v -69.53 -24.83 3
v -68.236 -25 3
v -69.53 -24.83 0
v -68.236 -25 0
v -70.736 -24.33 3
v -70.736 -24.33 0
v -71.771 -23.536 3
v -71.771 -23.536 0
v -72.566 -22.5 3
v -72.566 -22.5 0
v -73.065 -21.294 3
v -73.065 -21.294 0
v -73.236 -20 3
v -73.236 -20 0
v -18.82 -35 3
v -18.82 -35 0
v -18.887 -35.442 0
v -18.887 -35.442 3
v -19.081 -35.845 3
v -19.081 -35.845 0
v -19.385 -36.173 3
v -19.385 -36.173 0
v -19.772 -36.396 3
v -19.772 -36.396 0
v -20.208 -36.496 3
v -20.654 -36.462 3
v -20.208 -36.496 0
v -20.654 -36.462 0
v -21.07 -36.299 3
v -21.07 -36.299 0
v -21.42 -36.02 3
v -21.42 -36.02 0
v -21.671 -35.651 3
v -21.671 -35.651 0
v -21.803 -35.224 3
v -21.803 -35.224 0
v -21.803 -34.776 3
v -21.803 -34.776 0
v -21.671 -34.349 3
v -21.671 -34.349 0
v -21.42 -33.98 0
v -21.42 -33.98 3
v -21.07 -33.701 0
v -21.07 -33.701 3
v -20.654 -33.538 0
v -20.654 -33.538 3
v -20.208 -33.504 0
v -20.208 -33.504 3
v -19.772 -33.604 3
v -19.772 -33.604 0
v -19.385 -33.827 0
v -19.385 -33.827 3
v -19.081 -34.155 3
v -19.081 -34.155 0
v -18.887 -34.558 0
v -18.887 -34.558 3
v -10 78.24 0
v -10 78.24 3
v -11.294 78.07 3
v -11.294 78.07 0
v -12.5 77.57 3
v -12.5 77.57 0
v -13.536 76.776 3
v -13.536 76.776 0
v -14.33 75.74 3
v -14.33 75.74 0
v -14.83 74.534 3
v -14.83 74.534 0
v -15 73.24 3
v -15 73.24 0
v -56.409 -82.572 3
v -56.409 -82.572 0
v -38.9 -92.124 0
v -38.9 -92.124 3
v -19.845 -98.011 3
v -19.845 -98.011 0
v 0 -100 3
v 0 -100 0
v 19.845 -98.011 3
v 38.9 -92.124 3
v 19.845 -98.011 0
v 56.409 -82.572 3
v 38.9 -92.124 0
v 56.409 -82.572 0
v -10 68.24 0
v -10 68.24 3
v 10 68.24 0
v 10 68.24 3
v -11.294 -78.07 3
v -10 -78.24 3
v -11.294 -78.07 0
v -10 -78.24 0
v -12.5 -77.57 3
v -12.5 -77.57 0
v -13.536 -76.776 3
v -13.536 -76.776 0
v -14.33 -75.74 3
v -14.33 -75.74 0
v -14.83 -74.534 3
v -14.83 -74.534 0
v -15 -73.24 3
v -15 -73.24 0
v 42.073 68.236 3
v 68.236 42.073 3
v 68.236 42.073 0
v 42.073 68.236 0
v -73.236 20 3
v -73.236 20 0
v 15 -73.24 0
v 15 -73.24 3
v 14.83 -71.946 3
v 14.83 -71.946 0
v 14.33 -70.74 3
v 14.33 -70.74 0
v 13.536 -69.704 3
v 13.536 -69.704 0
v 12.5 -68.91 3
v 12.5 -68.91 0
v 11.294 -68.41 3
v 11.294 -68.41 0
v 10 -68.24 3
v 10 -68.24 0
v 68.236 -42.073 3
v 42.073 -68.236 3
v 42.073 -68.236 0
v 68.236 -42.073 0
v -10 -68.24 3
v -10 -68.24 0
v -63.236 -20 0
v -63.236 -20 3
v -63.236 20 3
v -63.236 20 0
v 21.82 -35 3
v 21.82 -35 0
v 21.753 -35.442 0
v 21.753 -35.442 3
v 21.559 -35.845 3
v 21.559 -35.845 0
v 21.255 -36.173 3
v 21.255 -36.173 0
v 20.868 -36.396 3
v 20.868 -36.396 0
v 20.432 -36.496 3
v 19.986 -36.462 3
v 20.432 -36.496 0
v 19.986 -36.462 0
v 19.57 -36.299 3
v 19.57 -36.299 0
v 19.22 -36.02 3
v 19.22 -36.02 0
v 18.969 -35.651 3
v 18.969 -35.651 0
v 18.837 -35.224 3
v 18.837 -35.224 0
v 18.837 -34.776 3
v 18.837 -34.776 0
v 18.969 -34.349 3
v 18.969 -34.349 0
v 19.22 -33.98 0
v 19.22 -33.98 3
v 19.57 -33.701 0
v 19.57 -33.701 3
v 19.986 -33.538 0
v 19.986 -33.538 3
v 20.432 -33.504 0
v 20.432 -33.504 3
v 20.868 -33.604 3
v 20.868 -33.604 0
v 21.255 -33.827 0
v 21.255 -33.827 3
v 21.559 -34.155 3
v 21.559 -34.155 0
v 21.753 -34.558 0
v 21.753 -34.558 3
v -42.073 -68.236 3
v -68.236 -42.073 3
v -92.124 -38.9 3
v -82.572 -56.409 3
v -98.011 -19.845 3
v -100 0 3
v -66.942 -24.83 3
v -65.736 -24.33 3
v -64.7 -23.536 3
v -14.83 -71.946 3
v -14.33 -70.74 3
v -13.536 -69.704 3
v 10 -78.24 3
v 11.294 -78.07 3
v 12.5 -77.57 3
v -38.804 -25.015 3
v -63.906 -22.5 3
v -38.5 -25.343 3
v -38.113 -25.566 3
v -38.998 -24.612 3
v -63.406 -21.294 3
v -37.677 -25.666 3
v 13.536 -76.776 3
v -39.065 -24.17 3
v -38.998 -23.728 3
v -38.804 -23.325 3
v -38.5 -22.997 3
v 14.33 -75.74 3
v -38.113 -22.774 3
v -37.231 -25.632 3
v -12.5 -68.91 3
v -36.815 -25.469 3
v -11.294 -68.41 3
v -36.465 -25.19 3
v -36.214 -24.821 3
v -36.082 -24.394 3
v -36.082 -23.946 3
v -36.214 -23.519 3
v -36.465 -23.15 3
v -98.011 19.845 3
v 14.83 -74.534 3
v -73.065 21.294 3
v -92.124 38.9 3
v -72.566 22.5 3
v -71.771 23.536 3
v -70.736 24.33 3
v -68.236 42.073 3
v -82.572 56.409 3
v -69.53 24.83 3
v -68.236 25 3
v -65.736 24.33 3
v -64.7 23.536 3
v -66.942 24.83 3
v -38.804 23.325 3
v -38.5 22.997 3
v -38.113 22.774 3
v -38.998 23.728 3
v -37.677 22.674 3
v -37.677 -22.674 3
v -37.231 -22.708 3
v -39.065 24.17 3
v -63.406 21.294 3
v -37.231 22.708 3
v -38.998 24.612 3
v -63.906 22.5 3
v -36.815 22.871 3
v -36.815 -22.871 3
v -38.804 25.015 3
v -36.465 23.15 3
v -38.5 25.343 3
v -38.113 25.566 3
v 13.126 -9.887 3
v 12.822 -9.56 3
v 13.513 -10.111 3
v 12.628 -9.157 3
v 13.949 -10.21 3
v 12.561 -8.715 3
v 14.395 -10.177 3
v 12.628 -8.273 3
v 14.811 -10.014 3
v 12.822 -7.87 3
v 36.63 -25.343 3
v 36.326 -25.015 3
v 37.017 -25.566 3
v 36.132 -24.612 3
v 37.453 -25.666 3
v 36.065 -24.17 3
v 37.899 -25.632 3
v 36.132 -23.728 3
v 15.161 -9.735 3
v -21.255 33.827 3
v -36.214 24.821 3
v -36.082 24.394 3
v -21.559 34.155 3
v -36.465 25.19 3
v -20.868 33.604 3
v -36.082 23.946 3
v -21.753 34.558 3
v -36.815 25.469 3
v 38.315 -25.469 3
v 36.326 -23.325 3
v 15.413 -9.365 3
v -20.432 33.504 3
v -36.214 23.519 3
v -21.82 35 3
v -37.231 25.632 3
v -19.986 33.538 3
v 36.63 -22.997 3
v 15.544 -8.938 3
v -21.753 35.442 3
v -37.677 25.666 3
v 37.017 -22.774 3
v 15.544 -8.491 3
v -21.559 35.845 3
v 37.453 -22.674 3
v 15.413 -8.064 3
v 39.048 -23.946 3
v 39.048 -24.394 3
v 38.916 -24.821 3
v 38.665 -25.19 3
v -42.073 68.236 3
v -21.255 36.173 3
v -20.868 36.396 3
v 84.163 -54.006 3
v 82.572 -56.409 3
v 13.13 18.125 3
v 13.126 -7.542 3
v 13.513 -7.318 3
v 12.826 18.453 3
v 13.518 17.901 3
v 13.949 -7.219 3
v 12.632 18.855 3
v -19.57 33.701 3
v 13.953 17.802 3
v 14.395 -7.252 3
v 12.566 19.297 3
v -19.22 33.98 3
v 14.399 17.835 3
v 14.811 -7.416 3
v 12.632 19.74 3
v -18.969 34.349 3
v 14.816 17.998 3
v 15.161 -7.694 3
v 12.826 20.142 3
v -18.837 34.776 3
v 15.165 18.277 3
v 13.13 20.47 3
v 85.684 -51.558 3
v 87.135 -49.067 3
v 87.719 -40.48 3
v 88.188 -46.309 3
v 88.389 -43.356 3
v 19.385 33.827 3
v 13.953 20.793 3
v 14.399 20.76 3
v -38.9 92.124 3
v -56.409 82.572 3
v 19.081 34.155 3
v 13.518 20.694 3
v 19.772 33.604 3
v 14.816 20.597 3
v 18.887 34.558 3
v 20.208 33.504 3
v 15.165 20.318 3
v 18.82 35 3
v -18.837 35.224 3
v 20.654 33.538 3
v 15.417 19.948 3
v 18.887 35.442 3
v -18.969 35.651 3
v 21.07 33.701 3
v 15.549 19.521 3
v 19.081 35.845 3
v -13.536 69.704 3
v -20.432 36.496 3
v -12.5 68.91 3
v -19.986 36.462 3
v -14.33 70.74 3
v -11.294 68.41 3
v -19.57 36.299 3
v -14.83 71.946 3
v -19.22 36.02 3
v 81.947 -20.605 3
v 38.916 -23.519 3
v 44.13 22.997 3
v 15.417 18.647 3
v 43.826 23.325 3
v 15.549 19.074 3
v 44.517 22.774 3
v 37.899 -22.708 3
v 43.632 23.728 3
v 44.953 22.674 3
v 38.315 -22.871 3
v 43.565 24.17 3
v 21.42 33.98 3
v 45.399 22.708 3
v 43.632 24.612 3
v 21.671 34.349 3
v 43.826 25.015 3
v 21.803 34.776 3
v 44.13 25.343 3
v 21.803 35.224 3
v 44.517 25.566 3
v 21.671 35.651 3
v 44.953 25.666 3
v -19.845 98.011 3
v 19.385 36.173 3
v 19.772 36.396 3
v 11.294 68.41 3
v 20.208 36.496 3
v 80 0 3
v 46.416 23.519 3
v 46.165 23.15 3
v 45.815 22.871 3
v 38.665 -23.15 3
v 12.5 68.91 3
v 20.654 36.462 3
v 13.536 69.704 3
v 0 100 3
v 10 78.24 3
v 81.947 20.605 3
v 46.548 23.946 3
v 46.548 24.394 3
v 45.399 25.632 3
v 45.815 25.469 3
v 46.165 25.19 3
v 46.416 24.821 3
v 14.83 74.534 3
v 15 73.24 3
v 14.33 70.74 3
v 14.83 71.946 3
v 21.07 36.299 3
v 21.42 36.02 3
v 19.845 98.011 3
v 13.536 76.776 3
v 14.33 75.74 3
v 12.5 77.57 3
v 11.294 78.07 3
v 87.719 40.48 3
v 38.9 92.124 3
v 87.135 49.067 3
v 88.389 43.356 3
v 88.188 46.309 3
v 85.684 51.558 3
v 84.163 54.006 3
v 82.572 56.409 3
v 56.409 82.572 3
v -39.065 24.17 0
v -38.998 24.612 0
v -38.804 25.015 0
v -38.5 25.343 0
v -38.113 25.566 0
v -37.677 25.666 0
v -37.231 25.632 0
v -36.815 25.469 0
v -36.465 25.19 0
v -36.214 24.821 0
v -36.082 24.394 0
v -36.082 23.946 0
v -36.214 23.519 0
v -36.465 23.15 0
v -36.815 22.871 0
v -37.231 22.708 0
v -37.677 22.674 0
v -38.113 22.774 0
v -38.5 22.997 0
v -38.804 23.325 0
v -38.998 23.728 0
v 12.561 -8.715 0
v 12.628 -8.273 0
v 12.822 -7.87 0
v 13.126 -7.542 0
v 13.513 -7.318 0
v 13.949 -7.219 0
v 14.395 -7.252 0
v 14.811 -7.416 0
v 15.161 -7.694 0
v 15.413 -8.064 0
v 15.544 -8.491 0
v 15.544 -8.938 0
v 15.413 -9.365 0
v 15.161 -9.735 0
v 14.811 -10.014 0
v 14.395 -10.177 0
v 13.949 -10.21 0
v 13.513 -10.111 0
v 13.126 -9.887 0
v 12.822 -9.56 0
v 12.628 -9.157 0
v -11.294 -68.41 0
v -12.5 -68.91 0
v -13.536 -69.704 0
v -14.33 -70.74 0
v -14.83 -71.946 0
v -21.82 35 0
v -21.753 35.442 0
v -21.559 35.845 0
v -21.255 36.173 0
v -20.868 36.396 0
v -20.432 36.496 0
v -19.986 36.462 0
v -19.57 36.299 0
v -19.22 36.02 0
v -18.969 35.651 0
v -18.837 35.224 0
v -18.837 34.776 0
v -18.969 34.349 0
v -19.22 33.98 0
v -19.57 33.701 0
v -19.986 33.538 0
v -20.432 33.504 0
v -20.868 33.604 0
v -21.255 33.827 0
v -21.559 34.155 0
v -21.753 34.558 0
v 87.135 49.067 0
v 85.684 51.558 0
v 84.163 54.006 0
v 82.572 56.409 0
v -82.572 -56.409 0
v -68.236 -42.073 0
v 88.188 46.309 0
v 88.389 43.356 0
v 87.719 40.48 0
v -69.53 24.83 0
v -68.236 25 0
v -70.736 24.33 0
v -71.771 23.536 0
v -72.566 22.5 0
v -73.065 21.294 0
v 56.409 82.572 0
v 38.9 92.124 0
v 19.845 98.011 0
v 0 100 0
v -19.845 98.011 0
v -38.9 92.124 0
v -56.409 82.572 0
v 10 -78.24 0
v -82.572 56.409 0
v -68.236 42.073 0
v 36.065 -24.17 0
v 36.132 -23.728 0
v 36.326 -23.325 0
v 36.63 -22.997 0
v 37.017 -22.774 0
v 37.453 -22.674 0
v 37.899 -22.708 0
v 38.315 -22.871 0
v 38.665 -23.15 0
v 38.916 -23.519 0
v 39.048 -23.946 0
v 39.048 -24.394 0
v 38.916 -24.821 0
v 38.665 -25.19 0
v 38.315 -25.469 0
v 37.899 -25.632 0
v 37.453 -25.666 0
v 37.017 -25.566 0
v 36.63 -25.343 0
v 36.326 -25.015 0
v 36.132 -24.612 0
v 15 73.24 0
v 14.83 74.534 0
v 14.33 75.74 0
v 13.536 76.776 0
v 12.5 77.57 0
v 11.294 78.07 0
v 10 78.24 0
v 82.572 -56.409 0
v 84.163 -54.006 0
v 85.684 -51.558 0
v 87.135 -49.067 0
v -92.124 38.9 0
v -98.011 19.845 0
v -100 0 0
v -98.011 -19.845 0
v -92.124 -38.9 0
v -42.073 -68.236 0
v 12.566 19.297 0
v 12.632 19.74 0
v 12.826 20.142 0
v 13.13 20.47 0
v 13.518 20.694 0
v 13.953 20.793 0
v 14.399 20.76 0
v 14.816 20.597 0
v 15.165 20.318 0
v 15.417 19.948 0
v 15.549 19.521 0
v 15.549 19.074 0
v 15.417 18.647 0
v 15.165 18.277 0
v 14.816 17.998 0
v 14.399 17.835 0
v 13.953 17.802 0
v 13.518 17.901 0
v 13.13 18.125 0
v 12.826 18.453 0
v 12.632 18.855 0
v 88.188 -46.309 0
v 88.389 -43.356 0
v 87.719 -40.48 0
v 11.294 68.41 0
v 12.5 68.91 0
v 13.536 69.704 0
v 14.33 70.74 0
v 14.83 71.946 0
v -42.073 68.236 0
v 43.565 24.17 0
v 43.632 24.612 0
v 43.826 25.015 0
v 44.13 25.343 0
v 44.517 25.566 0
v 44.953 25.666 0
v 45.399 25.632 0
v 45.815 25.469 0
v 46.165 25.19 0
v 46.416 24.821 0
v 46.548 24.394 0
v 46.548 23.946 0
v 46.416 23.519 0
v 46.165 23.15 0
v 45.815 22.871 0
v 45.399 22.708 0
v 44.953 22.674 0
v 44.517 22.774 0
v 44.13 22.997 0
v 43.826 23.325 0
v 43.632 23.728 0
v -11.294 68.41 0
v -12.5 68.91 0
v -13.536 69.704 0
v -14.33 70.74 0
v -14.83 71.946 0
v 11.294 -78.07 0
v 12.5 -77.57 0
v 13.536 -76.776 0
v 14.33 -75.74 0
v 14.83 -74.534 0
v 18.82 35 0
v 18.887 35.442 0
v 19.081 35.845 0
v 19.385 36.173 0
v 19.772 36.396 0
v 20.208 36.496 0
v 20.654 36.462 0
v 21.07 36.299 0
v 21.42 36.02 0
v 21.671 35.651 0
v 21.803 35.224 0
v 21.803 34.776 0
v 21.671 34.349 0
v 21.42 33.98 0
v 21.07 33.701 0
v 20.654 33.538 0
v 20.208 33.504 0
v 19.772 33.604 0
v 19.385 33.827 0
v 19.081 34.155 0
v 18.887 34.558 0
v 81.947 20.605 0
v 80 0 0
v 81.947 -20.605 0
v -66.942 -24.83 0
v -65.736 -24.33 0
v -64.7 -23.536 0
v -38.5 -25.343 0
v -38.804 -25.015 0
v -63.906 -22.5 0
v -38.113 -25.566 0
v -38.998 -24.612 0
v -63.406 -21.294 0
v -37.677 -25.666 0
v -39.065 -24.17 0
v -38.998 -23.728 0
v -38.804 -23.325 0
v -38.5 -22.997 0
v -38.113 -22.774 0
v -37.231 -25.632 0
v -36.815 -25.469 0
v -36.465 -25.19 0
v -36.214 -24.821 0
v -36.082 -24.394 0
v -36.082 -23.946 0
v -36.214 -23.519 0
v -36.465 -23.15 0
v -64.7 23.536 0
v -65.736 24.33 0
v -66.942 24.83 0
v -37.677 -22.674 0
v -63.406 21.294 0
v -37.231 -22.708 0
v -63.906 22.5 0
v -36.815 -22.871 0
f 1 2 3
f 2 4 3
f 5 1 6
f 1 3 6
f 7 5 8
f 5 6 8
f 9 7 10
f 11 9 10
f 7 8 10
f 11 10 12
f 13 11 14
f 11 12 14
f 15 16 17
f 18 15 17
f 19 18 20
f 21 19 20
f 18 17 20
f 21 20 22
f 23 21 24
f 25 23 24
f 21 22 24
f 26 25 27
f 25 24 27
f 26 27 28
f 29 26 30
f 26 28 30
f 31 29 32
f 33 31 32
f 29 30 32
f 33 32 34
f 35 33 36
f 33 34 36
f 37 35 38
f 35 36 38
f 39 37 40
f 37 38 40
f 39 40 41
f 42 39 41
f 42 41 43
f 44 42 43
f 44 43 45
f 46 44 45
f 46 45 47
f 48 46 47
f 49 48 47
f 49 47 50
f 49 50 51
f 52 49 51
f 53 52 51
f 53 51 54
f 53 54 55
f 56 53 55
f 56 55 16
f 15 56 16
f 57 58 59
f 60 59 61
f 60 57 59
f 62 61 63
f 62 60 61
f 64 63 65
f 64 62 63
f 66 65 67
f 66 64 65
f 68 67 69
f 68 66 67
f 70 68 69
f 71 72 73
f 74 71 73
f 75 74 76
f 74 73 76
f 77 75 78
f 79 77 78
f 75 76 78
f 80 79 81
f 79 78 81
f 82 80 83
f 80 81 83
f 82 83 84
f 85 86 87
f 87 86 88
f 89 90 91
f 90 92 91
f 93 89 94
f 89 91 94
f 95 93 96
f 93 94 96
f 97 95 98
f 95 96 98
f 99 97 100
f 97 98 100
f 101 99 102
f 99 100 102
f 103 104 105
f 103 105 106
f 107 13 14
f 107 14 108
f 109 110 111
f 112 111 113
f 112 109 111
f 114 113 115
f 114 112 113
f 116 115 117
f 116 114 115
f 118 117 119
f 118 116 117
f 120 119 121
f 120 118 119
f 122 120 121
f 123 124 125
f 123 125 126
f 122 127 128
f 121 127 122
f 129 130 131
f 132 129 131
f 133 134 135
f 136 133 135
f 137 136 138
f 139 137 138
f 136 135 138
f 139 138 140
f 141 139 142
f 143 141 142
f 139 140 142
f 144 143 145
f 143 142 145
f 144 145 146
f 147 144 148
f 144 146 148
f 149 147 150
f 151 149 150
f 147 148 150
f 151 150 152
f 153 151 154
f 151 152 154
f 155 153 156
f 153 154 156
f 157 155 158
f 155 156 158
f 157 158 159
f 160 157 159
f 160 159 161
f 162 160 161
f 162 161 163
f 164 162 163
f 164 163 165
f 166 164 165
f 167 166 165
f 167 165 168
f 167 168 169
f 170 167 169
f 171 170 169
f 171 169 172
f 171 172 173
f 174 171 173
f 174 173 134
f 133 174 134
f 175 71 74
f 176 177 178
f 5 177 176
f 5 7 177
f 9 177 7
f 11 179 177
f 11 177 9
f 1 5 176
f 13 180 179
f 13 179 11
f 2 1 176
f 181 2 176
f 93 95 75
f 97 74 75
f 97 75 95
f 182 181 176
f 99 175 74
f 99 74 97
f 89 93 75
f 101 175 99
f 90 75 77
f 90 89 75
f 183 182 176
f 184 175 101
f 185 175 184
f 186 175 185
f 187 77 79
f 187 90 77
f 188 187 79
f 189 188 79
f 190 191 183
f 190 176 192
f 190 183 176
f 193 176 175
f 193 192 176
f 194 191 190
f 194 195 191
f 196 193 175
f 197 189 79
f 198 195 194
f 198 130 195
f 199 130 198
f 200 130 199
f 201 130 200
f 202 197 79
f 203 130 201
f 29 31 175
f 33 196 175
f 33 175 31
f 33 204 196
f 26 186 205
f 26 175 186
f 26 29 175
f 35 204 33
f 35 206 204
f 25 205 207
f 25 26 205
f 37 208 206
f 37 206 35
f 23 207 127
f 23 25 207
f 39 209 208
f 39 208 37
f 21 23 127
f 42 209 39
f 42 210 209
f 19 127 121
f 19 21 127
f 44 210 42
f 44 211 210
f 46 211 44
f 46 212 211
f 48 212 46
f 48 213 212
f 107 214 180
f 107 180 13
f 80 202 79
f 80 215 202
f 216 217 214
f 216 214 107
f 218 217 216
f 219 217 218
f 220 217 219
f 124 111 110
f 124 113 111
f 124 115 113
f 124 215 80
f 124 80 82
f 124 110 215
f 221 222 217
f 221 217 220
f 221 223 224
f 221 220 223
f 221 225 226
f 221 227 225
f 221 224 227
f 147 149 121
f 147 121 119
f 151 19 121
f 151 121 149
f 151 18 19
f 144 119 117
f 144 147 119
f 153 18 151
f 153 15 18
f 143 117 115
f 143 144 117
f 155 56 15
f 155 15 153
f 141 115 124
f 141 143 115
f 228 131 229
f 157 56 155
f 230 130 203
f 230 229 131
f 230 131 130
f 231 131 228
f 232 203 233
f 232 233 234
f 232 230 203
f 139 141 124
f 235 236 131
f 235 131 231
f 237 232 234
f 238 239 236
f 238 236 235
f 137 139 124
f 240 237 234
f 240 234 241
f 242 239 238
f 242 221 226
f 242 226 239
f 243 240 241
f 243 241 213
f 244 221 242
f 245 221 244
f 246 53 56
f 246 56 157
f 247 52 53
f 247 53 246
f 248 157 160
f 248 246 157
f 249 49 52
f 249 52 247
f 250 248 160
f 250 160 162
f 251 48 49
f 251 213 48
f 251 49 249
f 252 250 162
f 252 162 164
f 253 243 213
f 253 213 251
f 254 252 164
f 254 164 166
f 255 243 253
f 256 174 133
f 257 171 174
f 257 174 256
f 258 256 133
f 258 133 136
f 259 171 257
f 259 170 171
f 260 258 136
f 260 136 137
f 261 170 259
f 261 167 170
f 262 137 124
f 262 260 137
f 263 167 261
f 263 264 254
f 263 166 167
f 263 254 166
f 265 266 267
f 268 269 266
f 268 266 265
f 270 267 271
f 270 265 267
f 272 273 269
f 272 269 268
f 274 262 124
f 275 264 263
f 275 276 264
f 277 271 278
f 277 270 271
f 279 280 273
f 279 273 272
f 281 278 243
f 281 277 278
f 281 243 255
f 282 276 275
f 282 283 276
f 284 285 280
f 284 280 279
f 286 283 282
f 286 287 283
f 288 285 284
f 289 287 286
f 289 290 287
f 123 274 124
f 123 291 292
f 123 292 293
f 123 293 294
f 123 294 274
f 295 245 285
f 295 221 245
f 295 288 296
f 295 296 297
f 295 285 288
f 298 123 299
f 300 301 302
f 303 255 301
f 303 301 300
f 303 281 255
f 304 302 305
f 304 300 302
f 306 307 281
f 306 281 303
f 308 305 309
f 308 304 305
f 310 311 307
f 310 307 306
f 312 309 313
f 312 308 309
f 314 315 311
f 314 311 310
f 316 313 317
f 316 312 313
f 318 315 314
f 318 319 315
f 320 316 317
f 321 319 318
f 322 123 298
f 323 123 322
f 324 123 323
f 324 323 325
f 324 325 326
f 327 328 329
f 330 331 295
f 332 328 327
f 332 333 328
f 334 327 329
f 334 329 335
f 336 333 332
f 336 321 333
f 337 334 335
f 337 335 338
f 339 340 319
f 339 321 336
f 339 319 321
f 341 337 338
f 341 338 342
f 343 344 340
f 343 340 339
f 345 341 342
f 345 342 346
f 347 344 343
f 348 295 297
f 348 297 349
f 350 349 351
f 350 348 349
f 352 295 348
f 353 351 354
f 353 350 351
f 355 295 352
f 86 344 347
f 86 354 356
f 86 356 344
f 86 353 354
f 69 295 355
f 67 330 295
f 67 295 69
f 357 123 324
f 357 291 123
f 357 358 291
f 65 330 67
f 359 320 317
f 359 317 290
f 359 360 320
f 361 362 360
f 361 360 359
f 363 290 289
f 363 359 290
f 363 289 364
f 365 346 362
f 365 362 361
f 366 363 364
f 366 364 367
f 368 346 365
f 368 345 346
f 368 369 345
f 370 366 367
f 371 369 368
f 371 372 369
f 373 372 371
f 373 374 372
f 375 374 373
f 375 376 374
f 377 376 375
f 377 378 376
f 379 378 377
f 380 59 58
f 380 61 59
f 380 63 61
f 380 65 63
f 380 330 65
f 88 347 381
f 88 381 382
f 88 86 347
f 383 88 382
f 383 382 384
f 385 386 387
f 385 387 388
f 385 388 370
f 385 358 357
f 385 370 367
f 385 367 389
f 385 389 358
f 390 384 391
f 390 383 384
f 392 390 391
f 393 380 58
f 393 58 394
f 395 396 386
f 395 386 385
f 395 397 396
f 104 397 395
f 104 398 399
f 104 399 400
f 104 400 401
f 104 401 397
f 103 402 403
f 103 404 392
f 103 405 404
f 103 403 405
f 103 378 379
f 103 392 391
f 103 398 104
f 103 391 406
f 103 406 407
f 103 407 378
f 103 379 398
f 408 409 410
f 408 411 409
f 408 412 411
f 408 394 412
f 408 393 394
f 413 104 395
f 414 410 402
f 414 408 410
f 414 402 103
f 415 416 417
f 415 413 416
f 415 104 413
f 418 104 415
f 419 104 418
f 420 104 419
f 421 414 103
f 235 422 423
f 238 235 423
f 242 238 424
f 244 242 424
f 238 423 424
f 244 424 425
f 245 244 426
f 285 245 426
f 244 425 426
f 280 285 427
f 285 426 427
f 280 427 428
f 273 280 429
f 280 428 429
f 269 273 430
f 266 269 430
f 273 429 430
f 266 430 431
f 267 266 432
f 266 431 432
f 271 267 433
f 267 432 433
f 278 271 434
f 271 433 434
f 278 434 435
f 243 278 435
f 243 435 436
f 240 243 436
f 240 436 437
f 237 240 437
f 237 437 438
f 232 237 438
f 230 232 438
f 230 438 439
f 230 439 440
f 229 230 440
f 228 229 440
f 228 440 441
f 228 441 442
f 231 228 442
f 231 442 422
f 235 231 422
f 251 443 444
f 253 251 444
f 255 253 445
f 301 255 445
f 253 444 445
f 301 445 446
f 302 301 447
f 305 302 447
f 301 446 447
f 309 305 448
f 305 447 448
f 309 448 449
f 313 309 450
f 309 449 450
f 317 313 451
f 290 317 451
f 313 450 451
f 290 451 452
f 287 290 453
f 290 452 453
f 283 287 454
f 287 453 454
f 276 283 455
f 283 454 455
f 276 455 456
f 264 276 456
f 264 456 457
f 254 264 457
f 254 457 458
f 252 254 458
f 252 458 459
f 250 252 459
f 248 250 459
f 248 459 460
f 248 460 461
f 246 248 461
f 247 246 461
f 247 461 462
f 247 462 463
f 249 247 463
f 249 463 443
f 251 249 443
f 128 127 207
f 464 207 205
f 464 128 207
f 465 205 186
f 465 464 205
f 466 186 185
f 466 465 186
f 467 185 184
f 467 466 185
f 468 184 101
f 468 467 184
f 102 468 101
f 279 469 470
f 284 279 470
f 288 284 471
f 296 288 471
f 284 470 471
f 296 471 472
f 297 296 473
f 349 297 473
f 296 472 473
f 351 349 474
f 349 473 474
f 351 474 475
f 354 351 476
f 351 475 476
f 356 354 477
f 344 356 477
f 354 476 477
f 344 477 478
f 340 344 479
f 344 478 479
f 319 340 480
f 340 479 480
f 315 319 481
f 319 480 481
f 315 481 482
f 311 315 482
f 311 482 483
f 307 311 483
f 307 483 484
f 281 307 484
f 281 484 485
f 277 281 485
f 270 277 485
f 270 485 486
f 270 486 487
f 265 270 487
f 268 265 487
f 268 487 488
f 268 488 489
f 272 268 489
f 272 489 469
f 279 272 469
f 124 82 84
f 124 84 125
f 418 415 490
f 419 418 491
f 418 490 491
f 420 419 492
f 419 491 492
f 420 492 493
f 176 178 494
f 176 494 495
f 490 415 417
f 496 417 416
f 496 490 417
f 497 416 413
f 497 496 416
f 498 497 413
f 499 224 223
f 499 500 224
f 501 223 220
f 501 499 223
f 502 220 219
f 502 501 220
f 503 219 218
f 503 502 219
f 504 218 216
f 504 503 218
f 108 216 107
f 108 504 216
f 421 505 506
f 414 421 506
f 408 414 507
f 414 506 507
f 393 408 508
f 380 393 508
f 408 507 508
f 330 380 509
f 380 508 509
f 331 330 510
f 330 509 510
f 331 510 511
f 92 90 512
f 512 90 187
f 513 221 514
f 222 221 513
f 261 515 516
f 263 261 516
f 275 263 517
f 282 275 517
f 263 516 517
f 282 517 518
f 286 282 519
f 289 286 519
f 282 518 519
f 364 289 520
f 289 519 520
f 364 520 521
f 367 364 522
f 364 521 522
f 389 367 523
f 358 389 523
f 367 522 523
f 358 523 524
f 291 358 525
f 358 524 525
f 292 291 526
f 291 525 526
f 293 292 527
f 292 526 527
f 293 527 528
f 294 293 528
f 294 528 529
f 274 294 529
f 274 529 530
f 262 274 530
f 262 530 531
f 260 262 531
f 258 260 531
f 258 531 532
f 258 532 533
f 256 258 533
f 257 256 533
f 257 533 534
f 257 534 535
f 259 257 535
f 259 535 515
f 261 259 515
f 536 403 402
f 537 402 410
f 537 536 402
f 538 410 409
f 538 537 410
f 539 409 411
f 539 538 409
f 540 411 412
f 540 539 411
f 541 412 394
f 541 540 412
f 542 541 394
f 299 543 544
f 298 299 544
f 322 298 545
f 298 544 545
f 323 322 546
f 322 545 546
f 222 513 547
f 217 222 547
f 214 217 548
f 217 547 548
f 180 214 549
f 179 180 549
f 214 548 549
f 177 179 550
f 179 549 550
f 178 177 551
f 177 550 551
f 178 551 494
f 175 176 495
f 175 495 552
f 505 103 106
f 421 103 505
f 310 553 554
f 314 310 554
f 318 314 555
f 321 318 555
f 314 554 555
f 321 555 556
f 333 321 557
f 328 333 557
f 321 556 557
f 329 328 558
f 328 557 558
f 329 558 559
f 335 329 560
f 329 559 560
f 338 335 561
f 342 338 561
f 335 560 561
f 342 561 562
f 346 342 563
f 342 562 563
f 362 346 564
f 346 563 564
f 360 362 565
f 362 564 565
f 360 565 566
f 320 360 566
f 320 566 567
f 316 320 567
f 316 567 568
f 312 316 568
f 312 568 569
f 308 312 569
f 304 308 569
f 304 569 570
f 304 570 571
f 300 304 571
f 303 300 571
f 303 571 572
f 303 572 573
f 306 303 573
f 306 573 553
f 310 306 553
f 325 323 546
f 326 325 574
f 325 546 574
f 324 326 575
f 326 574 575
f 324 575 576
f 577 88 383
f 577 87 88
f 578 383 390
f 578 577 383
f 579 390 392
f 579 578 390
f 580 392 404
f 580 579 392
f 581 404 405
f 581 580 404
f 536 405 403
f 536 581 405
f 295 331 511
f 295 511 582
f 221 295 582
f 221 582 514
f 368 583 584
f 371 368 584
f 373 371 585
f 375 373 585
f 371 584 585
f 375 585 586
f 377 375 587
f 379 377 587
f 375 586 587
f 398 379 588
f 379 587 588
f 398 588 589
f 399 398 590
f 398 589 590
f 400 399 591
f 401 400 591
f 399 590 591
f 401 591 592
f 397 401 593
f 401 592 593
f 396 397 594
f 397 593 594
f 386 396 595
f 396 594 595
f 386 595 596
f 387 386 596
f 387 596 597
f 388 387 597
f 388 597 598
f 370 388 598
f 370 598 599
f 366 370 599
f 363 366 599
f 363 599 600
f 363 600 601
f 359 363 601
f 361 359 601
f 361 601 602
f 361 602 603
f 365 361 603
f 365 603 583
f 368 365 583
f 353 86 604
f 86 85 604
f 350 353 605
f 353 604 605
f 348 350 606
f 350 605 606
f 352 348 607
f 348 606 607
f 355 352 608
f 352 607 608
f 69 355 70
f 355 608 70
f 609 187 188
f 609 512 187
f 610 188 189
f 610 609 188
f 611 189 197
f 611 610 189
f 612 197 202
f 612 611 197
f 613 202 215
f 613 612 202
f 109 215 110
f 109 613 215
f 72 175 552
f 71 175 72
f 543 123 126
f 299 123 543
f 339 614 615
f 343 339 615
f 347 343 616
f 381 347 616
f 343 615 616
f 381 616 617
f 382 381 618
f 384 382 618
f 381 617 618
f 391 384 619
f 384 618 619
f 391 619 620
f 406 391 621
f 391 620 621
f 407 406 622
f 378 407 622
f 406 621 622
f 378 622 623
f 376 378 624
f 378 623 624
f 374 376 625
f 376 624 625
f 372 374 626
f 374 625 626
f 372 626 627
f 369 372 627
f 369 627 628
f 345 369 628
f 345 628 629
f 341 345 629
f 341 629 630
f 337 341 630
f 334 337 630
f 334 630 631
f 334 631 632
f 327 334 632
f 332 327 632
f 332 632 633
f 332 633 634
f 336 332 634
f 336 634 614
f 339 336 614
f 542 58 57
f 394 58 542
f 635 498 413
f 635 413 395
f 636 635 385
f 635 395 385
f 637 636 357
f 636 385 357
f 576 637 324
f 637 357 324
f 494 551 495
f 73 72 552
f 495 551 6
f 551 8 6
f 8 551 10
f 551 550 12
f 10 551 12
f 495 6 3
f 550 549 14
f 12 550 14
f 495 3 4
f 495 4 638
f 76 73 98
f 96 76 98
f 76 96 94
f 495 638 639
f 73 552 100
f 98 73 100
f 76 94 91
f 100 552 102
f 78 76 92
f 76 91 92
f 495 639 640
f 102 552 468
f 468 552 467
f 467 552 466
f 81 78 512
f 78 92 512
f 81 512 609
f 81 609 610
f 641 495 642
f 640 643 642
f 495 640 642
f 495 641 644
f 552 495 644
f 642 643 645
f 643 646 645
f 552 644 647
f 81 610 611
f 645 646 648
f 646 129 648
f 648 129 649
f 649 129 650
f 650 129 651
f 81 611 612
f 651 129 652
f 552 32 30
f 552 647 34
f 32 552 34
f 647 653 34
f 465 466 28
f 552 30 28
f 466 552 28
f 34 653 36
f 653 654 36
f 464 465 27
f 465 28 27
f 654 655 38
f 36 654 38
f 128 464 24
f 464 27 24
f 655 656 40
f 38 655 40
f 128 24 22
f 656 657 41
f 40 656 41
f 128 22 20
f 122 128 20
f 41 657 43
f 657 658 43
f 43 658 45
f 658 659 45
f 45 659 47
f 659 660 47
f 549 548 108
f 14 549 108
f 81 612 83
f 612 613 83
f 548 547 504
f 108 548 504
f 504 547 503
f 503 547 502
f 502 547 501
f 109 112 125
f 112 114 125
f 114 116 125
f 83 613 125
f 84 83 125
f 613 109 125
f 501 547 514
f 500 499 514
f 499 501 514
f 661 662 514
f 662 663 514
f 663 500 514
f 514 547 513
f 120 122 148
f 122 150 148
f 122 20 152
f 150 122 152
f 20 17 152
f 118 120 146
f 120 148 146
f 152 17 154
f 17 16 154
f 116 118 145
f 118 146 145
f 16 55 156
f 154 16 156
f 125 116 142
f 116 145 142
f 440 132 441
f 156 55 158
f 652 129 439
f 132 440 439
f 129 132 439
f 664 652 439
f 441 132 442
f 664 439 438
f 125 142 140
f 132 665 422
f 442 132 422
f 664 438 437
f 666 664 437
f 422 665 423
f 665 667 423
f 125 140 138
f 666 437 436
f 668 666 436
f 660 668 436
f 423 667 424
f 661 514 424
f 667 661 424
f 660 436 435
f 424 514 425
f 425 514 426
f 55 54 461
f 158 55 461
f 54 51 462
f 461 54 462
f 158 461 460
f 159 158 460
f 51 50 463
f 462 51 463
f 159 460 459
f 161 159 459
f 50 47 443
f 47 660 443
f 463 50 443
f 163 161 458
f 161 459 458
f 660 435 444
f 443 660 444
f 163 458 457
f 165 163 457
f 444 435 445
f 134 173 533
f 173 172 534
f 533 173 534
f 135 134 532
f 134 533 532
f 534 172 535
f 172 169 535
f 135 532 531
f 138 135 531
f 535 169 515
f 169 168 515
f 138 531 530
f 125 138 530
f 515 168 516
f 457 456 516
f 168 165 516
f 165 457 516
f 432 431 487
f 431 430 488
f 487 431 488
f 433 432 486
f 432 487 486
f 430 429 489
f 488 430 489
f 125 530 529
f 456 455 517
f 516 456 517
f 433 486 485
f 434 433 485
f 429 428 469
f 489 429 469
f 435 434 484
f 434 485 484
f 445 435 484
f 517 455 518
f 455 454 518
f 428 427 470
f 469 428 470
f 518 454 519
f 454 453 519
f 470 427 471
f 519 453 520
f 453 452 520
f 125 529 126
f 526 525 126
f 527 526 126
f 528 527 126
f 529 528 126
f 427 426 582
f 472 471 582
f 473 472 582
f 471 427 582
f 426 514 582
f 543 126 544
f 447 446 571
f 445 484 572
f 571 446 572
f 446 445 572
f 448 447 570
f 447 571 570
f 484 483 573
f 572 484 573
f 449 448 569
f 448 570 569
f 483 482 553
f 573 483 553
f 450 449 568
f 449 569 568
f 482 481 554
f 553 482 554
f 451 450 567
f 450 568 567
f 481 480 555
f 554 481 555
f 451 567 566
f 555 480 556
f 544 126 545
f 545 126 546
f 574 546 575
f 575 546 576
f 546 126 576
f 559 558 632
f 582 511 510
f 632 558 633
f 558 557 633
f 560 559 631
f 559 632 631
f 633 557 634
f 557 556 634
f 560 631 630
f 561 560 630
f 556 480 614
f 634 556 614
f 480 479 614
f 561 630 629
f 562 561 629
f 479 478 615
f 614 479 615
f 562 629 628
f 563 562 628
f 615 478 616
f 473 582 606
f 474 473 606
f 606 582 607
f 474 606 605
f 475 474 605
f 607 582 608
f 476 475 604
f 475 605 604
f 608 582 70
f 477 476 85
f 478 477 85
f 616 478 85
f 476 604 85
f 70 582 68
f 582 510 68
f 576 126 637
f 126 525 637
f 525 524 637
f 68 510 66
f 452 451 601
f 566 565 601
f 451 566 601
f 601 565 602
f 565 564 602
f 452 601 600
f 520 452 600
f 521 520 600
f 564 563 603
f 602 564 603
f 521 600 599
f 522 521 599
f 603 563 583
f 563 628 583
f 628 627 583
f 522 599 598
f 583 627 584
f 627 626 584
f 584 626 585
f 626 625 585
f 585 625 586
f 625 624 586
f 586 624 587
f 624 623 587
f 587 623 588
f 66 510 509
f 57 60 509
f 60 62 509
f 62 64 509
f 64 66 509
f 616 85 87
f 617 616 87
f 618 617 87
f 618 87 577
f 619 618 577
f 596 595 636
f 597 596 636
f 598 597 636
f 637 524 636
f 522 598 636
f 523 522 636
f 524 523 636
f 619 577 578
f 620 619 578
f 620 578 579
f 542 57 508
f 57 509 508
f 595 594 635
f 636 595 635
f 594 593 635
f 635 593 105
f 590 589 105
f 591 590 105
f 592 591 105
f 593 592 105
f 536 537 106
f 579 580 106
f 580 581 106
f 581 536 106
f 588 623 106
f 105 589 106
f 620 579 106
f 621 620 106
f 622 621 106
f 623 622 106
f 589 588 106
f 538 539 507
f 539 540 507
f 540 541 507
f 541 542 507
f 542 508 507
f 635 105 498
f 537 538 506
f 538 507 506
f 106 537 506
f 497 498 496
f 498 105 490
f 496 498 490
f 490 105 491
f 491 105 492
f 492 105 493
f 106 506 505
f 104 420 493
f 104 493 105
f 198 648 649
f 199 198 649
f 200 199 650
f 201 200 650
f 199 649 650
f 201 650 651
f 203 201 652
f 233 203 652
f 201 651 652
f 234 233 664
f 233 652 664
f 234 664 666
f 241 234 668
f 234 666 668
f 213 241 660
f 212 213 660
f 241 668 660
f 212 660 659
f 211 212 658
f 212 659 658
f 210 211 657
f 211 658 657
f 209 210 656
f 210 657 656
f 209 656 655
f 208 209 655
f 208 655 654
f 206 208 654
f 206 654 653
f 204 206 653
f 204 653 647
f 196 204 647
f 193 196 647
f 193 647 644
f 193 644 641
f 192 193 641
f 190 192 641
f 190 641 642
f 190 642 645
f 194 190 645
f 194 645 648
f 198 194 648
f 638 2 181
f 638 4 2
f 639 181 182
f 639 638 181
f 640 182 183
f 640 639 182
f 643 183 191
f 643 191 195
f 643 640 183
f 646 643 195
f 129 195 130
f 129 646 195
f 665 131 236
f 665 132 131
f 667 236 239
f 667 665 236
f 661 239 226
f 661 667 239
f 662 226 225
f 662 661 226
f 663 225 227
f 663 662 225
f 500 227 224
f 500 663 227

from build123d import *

# Parameters (mm, degrees)
CROQUIS1_R              = 100
SALIENTE_EXTRUIR1_DEPTH = 3
CROQUIS3_R              = 110
CORTAR_EXTRUIR1_DEPTH   = 3
REDONDEO1_R             = 10
CORTAR_EXTRUIR2_DEPTH   = 142.453172607
CROQUIS6_W              = 10
CROQUIS6_H              = 50
CROQUIS6_W_2            = 30
CROQUIS6_H_2            = 10
CORTAR_EXTRUIR4_DEPTH   = 10
REDONDEO3_R             = 5
CROQUIS7_R              = 1.5
CORTAR_EXTRUIR5_DEPTH   = 142.453172607
CROQUIS8_R              = 1.5
CORTAR_EXTRUIR6_DEPTH   = 142.453172607


with BuildPart() as part:
    # Croquis1 → Saliente-Extruir1 (new body)
    with BuildSketch(Plane.XY):
        Circle(CROQUIS1_R)
    extrude(amount=SALIENTE_EXTRUIR1_DEPTH)

    # Croquis3 → Cortar-Extruir1 (cut)
    with BuildSketch(Plane.XY.offset(3)):
        with Locations((190, 0)):
            Circle(CROQUIS3_R)
    extrude(amount=-CORTAR_EXTRUIR1_DEPTH, mode=Mode.SUBTRACT)

    # Redondeo1
    redondeo1_edges = [part.edges().sort_by_distance(p)[0] for p in [
        (89.473684211, -44.659375654, 1.5),
        (89.473684211, 44.659375654, 1.5),
    ]]
    fillet(redondeo1_edges, radius=REDONDEO1_R)

    # Croquis4 → Cortar-Extruir2 (cut, through all)
    with BuildSketch(Plane.XY.offset(3)):
        Polygon((-57.629202667, -83.792153571), (-83.792153571, -57.629202667), (-68.235804385, -42.072853481), (-42.072853481, -68.235804385), align=None)
        Polygon((-57.629202667, 83.792153571), (-42.072853481, 68.235804385), (-68.235804385, 42.072853481), (-83.792153571, 57.629202667), align=None)
        Polygon((83.792153571, 57.629202667), (68.235804385, 42.072853481), (42.072853481, 68.235804385), (57.629202667, 83.792153571), align=None)
        Polygon((57.629202667, -83.792153571), (42.072853481, -68.235804385), (68.235804385, -42.072853481), (83.792153571, -57.629202667), align=None)
    extrude(amount=-CORTAR_EXTRUIR2_DEPTH, mode=Mode.SUBTRACT)

    # Croquis6 → Cortar-Extruir4 (cut)
    with BuildSketch(Plane.XY.offset(3)):
        with Locations((-68.235804385, 0)):
            Rectangle(CROQUIS6_W, CROQUIS6_H)
        with Locations((0, 73.24)):
            Rectangle(CROQUIS6_W_2, CROQUIS6_H_2)
        with Locations((0, -73.24)):
            Rectangle(CROQUIS6_W_2, CROQUIS6_H_2)
    extrude(amount=-CORTAR_EXTRUIR4_DEPTH, mode=Mode.SUBTRACT)

    # Redondeo3
    redondeo3_edges = [part.edges().sort_by_distance(p)[0] for p in [
        (15, -78.24, 1.5),
        (-15, -78.24, 1.5),
        (15, -68.24, 1.5),
        (-15, -68.24, 1.5),
        (-73.235804385, -25, 1.5),
        (-63.235804385, -25, 1.5),
        (-73.235804385, 25, 1.5),
        (-63.235804385, 25, 1.5),
        (-15, 68.24, 1.5),
        (15, 68.24, 1.5),
        (-15, 78.24, 1.5),
        (15, 78.24, 1.5),
    ]]
    fillet(redondeo3_edges, radius=REDONDEO3_R - 0.0001)  # a hair under: the kernel refuses the full size

    # Croquis7 → Cortar-Extruir5 (cut, through all)
    with BuildSketch(Plane(origin=(0, 0, 0), x_dir=(-1, 0, 0), z_dir=(0, 0, -1))):
        with Locations((37.565, -24.17)):
            Circle(CROQUIS7_R)
        with Locations((-37.565, -24.17)):
            Circle(CROQUIS7_R)
        with Locations((-45.065, 24.17)):
            Circle(CROQUIS7_R)
        with Locations((37.565, 24.17)):
            Circle(CROQUIS7_R)
        with Locations((-14.06559482, 19.297497716)):
            Circle(CROQUIS7_R)
        with Locations((-14.061195262, -8.714642909)):
            Circle(CROQUIS7_R)
    extrude(amount=-CORTAR_EXTRUIR5_DEPTH, mode=Mode.SUBTRACT)

    # Croquis8 → Cortar-Extruir6 (cut, through all)
    with BuildSketch(Plane(origin=(0, 0, 0), x_dir=(-1, 0, 0), z_dir=(0, 0, -1))):
        with Locations((-20.32, 35)):
            Circle(CROQUIS8_R)
        with Locations((20.32, 35)):
            Circle(CROQUIS8_R)
        with Locations(Location((20.32, -35, 0), (0, 0, 180))):
            Circle(CROQUIS8_R)
        with Locations(Location((-20.32, -35, 0), (0, 0, 180))):
            Circle(CROQUIS8_R)
    extrude(amount=-CORTAR_EXTRUIR6_DEPTH, mode=Mode.SUBTRACT)


solid = part.part
